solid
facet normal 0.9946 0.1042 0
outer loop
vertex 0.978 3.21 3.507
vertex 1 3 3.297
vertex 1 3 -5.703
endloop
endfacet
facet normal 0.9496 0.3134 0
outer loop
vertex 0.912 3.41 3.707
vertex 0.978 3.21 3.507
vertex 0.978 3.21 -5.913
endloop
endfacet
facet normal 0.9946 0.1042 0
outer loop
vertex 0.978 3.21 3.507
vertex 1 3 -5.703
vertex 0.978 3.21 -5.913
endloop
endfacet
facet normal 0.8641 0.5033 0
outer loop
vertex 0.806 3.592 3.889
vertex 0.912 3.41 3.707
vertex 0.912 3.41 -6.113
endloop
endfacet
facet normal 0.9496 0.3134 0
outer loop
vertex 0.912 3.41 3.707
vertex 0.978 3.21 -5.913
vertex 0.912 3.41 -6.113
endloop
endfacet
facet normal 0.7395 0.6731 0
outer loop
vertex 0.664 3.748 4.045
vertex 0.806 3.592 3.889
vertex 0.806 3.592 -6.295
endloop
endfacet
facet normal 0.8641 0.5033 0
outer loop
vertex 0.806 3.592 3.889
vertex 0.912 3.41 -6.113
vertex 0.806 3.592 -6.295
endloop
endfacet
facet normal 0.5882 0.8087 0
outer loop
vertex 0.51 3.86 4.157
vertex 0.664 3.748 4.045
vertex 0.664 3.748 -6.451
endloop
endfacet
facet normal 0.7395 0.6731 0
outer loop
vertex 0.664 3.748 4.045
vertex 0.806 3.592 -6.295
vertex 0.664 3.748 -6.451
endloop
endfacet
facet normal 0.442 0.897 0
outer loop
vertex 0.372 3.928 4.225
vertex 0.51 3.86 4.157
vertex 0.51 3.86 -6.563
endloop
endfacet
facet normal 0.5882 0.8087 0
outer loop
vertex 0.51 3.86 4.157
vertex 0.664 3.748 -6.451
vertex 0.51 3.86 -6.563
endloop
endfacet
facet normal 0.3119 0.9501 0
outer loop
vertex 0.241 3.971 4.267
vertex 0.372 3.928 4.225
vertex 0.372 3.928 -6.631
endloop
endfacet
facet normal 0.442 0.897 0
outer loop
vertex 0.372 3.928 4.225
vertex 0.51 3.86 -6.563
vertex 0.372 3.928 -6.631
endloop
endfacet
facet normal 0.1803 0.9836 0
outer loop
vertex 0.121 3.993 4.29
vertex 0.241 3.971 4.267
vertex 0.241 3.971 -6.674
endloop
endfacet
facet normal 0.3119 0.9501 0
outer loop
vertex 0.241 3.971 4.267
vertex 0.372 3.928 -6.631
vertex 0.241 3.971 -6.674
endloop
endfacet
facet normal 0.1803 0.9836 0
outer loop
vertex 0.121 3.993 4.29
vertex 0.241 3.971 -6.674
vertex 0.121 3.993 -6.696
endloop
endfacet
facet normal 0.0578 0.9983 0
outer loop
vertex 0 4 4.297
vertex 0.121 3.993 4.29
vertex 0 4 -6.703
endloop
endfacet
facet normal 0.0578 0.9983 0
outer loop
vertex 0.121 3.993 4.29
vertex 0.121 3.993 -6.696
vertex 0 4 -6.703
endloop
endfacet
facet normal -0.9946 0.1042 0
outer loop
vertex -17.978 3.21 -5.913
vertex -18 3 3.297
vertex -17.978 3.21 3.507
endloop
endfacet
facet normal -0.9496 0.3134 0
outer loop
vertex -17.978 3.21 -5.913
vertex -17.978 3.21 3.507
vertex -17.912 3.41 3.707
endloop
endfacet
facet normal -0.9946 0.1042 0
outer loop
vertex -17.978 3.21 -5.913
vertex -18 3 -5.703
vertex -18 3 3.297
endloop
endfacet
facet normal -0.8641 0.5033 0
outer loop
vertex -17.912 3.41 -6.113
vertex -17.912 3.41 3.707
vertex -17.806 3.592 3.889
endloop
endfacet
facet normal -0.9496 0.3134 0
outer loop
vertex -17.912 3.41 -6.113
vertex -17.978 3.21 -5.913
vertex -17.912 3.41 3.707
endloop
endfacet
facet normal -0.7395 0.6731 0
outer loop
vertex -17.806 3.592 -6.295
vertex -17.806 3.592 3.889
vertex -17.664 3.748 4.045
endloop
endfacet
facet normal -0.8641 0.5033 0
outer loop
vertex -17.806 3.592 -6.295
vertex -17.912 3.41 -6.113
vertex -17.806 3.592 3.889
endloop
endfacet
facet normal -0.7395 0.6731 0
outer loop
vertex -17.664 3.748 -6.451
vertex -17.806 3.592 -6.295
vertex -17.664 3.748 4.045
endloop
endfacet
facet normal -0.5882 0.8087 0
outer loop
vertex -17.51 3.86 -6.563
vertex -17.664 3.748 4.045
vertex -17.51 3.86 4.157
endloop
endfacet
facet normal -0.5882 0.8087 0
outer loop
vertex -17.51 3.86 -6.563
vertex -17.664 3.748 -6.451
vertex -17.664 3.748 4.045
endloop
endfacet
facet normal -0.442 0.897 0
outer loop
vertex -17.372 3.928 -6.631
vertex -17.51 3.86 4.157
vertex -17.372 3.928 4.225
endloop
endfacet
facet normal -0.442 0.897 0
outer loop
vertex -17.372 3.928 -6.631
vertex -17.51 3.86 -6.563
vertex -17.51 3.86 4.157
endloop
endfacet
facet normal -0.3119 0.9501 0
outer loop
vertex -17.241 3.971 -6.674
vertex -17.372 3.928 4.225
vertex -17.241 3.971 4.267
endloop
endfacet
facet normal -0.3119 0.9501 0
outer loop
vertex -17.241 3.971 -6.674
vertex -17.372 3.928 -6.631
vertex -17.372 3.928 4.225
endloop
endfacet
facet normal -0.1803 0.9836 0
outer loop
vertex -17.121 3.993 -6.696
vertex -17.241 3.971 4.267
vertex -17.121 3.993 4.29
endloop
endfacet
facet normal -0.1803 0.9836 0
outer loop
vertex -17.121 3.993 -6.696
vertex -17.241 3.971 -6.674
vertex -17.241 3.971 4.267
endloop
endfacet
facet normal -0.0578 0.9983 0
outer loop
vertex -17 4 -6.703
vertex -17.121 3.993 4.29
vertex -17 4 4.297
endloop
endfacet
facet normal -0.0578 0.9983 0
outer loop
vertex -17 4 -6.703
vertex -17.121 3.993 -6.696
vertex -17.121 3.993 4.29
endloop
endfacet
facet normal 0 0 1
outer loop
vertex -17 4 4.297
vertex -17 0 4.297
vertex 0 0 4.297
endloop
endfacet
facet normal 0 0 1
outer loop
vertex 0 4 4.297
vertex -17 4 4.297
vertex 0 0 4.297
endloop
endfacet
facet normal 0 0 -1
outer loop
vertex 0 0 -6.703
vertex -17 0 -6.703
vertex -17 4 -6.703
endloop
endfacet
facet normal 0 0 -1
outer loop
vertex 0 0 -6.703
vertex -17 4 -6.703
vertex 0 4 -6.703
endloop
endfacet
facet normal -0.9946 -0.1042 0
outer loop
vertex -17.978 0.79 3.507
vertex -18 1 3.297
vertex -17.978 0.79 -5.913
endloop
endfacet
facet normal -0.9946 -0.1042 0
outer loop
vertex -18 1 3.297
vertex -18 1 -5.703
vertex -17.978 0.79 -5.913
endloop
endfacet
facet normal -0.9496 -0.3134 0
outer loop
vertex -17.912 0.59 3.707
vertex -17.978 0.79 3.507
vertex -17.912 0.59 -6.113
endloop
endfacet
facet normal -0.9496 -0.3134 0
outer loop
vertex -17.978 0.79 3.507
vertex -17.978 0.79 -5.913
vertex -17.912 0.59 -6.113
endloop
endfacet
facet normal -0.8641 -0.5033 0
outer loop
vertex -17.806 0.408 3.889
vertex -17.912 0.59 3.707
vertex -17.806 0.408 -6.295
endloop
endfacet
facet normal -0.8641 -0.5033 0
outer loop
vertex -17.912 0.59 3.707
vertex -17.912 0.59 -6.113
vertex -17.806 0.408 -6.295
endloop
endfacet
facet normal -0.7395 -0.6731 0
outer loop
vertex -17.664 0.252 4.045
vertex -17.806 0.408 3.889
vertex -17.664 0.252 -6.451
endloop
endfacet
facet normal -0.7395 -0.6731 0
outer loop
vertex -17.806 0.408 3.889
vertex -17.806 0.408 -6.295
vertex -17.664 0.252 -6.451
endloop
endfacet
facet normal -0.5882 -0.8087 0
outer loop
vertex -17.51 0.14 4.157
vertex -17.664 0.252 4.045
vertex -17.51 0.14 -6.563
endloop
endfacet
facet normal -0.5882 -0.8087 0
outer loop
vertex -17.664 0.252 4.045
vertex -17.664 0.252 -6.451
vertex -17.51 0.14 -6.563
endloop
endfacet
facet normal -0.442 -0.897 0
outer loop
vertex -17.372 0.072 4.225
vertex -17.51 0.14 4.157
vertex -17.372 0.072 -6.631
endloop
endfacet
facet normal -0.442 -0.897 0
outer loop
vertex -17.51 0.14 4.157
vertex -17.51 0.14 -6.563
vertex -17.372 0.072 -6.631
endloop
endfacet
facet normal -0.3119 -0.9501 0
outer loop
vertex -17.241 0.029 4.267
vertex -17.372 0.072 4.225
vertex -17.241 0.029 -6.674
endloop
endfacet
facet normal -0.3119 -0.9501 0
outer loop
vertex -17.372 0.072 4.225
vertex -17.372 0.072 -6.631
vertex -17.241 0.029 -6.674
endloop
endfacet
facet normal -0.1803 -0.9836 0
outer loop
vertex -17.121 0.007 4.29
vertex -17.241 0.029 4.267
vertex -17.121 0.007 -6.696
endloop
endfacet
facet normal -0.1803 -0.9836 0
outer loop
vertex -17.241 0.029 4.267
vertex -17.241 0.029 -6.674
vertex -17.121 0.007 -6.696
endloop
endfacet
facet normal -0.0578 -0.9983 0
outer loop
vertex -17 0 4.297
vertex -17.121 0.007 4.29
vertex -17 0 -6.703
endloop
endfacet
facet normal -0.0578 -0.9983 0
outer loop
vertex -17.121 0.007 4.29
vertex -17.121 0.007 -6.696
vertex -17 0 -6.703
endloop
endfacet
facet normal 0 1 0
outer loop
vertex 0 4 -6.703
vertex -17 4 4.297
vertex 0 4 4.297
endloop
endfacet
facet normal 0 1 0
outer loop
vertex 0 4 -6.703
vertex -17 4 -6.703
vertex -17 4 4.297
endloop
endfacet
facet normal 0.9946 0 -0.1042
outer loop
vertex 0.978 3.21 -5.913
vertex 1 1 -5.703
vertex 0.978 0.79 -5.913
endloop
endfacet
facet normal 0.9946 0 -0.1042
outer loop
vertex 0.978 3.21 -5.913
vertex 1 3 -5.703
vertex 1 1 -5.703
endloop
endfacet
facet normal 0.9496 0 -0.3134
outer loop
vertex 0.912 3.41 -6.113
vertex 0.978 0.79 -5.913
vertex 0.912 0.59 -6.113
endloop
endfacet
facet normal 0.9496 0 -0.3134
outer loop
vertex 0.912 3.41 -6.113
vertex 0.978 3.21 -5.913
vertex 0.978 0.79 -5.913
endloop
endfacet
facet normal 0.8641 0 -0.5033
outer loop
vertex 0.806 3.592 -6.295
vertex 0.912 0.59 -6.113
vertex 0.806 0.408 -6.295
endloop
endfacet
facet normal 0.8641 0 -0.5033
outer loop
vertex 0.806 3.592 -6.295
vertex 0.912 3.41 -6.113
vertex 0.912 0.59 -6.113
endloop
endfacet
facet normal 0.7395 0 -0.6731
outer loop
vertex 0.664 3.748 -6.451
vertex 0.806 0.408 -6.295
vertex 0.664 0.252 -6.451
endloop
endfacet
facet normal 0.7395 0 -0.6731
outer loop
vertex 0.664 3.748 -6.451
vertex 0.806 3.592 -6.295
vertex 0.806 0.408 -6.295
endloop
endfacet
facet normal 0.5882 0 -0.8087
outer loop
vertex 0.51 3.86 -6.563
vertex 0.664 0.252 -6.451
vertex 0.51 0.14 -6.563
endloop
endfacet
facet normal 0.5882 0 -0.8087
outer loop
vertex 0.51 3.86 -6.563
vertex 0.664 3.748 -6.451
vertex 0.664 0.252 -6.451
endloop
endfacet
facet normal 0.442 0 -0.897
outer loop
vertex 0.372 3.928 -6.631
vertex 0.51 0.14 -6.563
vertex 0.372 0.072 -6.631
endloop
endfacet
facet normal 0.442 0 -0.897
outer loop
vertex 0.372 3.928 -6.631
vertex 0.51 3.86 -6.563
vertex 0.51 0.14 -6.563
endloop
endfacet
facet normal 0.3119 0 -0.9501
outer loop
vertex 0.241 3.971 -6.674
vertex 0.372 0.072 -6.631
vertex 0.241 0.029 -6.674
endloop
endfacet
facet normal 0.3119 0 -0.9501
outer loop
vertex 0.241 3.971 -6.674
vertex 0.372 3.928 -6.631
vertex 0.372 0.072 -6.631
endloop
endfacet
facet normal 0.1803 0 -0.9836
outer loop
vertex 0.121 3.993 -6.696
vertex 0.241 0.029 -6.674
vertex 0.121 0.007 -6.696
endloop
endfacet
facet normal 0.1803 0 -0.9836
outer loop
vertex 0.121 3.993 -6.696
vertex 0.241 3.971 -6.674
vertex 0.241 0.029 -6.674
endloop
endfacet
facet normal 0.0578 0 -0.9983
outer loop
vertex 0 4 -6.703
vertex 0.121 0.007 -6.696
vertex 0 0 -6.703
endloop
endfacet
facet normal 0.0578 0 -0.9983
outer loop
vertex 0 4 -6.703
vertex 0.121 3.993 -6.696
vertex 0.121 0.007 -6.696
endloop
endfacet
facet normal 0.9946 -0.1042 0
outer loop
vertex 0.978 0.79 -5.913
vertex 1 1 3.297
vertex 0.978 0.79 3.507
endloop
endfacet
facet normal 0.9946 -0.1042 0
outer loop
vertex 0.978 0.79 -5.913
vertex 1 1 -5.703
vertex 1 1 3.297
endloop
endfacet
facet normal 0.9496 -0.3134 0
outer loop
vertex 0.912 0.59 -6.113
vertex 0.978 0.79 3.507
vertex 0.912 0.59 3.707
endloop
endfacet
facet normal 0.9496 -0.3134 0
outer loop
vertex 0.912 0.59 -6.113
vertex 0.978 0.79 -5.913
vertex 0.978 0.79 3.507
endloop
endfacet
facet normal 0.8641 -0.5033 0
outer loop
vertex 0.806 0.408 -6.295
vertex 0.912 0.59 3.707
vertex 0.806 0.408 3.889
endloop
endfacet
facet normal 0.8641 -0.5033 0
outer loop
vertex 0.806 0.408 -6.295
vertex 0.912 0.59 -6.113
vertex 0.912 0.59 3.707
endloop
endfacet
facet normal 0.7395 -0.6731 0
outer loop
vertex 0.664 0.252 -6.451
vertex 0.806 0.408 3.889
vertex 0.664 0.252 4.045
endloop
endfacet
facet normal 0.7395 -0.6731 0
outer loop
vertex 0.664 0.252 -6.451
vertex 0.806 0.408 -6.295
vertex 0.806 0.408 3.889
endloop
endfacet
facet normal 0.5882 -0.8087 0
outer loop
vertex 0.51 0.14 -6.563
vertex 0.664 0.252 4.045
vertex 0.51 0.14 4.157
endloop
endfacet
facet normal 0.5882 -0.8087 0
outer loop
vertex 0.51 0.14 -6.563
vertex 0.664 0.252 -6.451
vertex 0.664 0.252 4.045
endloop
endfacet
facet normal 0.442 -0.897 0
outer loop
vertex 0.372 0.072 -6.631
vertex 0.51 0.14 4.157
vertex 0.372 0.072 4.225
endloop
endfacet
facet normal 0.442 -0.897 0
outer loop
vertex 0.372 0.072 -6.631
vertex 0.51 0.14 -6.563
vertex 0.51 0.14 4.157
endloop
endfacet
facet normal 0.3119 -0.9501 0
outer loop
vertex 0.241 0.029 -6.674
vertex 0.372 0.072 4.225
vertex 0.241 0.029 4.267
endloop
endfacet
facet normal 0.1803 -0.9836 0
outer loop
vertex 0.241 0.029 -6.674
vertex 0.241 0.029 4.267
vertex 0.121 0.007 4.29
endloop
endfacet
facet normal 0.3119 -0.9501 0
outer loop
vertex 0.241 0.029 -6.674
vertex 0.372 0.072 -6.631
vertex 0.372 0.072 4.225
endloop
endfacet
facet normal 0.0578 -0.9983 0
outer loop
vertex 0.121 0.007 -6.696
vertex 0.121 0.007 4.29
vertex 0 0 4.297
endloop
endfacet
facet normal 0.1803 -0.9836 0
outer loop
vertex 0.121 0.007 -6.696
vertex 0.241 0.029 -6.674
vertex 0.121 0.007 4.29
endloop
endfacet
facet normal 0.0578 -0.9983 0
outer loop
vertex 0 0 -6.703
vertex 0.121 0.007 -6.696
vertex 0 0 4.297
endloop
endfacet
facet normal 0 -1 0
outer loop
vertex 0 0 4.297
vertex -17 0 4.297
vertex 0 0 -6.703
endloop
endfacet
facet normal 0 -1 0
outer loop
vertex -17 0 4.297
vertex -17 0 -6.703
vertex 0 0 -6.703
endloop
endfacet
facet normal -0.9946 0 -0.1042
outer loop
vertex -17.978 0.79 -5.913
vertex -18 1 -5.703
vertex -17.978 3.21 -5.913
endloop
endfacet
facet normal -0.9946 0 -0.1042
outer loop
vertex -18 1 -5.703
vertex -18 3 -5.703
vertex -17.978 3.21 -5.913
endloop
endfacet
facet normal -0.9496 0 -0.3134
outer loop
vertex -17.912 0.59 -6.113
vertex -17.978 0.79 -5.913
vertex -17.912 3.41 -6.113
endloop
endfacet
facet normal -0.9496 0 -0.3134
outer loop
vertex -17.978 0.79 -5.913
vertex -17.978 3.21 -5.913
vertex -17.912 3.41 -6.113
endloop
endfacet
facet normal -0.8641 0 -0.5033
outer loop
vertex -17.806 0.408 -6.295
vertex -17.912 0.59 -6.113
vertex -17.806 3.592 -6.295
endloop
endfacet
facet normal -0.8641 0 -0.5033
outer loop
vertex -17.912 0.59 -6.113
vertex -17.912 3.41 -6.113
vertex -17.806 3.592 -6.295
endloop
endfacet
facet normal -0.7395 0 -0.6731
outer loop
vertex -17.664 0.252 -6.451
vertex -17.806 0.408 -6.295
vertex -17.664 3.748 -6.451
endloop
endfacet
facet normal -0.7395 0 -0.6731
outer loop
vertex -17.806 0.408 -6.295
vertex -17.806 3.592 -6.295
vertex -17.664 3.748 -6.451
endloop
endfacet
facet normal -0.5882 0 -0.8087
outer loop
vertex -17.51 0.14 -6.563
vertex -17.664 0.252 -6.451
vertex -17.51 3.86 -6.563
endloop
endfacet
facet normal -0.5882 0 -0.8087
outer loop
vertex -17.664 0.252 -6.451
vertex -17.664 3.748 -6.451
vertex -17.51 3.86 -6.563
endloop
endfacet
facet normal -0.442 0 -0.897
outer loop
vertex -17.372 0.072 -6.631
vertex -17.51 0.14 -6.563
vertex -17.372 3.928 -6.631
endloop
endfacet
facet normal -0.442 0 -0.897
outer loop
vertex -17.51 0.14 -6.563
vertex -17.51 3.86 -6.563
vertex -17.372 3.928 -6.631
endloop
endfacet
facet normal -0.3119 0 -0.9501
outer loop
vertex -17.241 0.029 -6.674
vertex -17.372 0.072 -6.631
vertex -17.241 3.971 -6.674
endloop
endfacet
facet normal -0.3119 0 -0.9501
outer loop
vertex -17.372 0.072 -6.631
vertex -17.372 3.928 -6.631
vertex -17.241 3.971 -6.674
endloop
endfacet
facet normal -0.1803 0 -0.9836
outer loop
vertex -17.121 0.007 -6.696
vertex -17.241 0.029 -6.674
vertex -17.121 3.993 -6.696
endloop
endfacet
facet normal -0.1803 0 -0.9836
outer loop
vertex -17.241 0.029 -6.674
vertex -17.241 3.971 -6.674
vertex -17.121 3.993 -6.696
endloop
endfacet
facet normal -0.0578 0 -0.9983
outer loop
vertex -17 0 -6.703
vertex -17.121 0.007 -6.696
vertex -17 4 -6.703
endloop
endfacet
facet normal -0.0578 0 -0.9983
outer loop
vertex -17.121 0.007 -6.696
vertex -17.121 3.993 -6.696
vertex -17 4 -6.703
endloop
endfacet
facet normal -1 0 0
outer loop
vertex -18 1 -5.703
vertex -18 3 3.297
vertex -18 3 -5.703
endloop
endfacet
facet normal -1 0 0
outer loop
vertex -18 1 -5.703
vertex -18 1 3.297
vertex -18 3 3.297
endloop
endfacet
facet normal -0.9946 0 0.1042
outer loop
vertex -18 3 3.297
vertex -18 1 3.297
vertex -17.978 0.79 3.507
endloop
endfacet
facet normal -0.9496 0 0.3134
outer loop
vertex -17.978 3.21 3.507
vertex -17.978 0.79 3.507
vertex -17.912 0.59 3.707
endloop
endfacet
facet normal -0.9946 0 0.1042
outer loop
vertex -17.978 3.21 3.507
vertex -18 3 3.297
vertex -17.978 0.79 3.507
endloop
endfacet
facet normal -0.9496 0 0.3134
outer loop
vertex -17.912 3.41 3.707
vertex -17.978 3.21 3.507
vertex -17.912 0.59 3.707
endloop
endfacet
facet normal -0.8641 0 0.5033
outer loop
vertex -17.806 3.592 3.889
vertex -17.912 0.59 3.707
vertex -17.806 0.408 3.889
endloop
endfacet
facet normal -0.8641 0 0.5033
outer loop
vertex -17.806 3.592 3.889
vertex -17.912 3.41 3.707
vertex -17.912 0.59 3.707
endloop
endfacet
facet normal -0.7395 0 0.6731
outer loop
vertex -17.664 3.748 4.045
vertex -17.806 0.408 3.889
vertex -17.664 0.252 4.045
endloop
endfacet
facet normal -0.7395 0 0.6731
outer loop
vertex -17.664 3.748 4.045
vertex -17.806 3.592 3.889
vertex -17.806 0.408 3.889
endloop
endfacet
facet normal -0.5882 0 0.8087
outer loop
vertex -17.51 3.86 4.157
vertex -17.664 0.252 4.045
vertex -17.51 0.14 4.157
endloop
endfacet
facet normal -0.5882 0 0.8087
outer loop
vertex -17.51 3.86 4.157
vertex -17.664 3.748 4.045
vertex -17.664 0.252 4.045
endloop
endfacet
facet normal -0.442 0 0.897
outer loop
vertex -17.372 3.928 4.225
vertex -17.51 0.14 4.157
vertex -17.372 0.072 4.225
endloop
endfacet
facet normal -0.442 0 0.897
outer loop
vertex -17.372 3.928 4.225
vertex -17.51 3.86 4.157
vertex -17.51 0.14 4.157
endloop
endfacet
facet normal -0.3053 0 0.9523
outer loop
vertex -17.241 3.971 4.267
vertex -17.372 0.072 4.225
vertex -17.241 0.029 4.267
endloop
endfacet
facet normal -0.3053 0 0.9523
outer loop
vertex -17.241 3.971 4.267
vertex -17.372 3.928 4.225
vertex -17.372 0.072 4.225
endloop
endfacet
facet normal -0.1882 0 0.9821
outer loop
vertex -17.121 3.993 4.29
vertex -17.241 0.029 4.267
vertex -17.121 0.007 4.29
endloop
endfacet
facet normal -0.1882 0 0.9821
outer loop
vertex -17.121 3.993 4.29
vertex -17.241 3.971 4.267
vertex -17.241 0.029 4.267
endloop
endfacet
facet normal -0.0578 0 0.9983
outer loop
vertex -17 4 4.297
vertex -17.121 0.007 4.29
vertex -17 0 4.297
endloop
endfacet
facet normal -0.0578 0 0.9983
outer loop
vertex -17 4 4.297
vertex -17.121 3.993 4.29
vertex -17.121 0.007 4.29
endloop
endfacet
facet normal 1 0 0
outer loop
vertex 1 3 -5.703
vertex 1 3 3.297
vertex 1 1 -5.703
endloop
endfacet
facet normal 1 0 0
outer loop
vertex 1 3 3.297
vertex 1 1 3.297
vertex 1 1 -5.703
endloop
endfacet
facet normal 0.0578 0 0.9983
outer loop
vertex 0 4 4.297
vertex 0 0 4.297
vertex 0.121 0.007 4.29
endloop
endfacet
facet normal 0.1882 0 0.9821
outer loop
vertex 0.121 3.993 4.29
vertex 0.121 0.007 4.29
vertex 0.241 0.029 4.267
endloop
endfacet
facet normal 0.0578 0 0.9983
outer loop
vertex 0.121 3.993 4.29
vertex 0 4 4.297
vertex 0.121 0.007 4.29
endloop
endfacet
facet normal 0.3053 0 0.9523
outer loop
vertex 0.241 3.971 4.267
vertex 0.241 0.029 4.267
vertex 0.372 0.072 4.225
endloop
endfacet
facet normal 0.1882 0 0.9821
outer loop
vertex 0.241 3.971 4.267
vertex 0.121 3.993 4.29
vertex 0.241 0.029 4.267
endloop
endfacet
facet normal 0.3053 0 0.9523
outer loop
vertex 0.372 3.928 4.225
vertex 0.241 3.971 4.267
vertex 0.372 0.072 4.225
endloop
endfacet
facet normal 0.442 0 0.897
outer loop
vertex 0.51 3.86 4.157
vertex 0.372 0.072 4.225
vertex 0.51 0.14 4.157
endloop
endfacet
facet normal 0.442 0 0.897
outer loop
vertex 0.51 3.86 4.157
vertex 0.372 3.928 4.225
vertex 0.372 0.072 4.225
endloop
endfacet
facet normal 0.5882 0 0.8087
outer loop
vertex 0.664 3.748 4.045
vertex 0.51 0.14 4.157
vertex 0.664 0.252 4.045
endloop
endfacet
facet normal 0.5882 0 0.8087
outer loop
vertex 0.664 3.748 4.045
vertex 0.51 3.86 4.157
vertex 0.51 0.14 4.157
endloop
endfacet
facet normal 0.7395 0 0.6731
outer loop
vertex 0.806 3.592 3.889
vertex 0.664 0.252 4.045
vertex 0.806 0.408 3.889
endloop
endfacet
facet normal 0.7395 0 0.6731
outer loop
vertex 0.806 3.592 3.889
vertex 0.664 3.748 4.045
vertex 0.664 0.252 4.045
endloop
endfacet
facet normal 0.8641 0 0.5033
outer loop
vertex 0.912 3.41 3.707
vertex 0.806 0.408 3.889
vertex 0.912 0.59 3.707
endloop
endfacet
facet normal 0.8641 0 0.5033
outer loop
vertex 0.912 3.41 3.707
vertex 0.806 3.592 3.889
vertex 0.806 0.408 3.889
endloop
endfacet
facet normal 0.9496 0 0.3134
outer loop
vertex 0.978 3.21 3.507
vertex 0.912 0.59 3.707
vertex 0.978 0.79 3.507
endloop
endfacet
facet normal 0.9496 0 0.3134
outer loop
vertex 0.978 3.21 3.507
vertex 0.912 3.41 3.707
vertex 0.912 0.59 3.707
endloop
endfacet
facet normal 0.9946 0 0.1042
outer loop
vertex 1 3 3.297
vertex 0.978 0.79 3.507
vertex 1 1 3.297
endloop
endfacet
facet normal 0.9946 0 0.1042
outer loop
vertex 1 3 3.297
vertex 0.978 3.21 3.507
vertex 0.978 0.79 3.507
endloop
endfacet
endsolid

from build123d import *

# Parameters (mm, degrees)
SKETCH_1_W      = 19
SKETCH_1_H      = 11
EXTRUDE_1_DEPTH = 4
FILLET_1_R      = 1


with BuildPart() as part:
    # 草图1 → 凸台-拉伸1 (new body)
    with BuildSketch(Plane(origin=(0, 0, 0), x_dir=(1, 0, 0), z_dir=(0, 1, 0))):
        with Locations((-8.5, 1.203125)):
            Rectangle(SKETCH_1_W, SKETCH_1_H)
    extrude(amount=EXTRUDE_1_DEPTH)

    # 圆角1
    fillet_1_edges = [part.edges().sort_by_distance(p)[0] for p in [
        (-18, 4, -1.203125),
        (1, 4, -1.203125),
        (-18, 0, -1.203125),
        (1, 0, -1.203125),
        (1, 2, 4.296875),
        (-18, 2, 4.296875),
        (-18, 2, -6.703125),
        (1, 2, -6.703125),
    ]]
    fillet(fillet_1_edges, radius=FILLET_1_R)


solid = part.part
